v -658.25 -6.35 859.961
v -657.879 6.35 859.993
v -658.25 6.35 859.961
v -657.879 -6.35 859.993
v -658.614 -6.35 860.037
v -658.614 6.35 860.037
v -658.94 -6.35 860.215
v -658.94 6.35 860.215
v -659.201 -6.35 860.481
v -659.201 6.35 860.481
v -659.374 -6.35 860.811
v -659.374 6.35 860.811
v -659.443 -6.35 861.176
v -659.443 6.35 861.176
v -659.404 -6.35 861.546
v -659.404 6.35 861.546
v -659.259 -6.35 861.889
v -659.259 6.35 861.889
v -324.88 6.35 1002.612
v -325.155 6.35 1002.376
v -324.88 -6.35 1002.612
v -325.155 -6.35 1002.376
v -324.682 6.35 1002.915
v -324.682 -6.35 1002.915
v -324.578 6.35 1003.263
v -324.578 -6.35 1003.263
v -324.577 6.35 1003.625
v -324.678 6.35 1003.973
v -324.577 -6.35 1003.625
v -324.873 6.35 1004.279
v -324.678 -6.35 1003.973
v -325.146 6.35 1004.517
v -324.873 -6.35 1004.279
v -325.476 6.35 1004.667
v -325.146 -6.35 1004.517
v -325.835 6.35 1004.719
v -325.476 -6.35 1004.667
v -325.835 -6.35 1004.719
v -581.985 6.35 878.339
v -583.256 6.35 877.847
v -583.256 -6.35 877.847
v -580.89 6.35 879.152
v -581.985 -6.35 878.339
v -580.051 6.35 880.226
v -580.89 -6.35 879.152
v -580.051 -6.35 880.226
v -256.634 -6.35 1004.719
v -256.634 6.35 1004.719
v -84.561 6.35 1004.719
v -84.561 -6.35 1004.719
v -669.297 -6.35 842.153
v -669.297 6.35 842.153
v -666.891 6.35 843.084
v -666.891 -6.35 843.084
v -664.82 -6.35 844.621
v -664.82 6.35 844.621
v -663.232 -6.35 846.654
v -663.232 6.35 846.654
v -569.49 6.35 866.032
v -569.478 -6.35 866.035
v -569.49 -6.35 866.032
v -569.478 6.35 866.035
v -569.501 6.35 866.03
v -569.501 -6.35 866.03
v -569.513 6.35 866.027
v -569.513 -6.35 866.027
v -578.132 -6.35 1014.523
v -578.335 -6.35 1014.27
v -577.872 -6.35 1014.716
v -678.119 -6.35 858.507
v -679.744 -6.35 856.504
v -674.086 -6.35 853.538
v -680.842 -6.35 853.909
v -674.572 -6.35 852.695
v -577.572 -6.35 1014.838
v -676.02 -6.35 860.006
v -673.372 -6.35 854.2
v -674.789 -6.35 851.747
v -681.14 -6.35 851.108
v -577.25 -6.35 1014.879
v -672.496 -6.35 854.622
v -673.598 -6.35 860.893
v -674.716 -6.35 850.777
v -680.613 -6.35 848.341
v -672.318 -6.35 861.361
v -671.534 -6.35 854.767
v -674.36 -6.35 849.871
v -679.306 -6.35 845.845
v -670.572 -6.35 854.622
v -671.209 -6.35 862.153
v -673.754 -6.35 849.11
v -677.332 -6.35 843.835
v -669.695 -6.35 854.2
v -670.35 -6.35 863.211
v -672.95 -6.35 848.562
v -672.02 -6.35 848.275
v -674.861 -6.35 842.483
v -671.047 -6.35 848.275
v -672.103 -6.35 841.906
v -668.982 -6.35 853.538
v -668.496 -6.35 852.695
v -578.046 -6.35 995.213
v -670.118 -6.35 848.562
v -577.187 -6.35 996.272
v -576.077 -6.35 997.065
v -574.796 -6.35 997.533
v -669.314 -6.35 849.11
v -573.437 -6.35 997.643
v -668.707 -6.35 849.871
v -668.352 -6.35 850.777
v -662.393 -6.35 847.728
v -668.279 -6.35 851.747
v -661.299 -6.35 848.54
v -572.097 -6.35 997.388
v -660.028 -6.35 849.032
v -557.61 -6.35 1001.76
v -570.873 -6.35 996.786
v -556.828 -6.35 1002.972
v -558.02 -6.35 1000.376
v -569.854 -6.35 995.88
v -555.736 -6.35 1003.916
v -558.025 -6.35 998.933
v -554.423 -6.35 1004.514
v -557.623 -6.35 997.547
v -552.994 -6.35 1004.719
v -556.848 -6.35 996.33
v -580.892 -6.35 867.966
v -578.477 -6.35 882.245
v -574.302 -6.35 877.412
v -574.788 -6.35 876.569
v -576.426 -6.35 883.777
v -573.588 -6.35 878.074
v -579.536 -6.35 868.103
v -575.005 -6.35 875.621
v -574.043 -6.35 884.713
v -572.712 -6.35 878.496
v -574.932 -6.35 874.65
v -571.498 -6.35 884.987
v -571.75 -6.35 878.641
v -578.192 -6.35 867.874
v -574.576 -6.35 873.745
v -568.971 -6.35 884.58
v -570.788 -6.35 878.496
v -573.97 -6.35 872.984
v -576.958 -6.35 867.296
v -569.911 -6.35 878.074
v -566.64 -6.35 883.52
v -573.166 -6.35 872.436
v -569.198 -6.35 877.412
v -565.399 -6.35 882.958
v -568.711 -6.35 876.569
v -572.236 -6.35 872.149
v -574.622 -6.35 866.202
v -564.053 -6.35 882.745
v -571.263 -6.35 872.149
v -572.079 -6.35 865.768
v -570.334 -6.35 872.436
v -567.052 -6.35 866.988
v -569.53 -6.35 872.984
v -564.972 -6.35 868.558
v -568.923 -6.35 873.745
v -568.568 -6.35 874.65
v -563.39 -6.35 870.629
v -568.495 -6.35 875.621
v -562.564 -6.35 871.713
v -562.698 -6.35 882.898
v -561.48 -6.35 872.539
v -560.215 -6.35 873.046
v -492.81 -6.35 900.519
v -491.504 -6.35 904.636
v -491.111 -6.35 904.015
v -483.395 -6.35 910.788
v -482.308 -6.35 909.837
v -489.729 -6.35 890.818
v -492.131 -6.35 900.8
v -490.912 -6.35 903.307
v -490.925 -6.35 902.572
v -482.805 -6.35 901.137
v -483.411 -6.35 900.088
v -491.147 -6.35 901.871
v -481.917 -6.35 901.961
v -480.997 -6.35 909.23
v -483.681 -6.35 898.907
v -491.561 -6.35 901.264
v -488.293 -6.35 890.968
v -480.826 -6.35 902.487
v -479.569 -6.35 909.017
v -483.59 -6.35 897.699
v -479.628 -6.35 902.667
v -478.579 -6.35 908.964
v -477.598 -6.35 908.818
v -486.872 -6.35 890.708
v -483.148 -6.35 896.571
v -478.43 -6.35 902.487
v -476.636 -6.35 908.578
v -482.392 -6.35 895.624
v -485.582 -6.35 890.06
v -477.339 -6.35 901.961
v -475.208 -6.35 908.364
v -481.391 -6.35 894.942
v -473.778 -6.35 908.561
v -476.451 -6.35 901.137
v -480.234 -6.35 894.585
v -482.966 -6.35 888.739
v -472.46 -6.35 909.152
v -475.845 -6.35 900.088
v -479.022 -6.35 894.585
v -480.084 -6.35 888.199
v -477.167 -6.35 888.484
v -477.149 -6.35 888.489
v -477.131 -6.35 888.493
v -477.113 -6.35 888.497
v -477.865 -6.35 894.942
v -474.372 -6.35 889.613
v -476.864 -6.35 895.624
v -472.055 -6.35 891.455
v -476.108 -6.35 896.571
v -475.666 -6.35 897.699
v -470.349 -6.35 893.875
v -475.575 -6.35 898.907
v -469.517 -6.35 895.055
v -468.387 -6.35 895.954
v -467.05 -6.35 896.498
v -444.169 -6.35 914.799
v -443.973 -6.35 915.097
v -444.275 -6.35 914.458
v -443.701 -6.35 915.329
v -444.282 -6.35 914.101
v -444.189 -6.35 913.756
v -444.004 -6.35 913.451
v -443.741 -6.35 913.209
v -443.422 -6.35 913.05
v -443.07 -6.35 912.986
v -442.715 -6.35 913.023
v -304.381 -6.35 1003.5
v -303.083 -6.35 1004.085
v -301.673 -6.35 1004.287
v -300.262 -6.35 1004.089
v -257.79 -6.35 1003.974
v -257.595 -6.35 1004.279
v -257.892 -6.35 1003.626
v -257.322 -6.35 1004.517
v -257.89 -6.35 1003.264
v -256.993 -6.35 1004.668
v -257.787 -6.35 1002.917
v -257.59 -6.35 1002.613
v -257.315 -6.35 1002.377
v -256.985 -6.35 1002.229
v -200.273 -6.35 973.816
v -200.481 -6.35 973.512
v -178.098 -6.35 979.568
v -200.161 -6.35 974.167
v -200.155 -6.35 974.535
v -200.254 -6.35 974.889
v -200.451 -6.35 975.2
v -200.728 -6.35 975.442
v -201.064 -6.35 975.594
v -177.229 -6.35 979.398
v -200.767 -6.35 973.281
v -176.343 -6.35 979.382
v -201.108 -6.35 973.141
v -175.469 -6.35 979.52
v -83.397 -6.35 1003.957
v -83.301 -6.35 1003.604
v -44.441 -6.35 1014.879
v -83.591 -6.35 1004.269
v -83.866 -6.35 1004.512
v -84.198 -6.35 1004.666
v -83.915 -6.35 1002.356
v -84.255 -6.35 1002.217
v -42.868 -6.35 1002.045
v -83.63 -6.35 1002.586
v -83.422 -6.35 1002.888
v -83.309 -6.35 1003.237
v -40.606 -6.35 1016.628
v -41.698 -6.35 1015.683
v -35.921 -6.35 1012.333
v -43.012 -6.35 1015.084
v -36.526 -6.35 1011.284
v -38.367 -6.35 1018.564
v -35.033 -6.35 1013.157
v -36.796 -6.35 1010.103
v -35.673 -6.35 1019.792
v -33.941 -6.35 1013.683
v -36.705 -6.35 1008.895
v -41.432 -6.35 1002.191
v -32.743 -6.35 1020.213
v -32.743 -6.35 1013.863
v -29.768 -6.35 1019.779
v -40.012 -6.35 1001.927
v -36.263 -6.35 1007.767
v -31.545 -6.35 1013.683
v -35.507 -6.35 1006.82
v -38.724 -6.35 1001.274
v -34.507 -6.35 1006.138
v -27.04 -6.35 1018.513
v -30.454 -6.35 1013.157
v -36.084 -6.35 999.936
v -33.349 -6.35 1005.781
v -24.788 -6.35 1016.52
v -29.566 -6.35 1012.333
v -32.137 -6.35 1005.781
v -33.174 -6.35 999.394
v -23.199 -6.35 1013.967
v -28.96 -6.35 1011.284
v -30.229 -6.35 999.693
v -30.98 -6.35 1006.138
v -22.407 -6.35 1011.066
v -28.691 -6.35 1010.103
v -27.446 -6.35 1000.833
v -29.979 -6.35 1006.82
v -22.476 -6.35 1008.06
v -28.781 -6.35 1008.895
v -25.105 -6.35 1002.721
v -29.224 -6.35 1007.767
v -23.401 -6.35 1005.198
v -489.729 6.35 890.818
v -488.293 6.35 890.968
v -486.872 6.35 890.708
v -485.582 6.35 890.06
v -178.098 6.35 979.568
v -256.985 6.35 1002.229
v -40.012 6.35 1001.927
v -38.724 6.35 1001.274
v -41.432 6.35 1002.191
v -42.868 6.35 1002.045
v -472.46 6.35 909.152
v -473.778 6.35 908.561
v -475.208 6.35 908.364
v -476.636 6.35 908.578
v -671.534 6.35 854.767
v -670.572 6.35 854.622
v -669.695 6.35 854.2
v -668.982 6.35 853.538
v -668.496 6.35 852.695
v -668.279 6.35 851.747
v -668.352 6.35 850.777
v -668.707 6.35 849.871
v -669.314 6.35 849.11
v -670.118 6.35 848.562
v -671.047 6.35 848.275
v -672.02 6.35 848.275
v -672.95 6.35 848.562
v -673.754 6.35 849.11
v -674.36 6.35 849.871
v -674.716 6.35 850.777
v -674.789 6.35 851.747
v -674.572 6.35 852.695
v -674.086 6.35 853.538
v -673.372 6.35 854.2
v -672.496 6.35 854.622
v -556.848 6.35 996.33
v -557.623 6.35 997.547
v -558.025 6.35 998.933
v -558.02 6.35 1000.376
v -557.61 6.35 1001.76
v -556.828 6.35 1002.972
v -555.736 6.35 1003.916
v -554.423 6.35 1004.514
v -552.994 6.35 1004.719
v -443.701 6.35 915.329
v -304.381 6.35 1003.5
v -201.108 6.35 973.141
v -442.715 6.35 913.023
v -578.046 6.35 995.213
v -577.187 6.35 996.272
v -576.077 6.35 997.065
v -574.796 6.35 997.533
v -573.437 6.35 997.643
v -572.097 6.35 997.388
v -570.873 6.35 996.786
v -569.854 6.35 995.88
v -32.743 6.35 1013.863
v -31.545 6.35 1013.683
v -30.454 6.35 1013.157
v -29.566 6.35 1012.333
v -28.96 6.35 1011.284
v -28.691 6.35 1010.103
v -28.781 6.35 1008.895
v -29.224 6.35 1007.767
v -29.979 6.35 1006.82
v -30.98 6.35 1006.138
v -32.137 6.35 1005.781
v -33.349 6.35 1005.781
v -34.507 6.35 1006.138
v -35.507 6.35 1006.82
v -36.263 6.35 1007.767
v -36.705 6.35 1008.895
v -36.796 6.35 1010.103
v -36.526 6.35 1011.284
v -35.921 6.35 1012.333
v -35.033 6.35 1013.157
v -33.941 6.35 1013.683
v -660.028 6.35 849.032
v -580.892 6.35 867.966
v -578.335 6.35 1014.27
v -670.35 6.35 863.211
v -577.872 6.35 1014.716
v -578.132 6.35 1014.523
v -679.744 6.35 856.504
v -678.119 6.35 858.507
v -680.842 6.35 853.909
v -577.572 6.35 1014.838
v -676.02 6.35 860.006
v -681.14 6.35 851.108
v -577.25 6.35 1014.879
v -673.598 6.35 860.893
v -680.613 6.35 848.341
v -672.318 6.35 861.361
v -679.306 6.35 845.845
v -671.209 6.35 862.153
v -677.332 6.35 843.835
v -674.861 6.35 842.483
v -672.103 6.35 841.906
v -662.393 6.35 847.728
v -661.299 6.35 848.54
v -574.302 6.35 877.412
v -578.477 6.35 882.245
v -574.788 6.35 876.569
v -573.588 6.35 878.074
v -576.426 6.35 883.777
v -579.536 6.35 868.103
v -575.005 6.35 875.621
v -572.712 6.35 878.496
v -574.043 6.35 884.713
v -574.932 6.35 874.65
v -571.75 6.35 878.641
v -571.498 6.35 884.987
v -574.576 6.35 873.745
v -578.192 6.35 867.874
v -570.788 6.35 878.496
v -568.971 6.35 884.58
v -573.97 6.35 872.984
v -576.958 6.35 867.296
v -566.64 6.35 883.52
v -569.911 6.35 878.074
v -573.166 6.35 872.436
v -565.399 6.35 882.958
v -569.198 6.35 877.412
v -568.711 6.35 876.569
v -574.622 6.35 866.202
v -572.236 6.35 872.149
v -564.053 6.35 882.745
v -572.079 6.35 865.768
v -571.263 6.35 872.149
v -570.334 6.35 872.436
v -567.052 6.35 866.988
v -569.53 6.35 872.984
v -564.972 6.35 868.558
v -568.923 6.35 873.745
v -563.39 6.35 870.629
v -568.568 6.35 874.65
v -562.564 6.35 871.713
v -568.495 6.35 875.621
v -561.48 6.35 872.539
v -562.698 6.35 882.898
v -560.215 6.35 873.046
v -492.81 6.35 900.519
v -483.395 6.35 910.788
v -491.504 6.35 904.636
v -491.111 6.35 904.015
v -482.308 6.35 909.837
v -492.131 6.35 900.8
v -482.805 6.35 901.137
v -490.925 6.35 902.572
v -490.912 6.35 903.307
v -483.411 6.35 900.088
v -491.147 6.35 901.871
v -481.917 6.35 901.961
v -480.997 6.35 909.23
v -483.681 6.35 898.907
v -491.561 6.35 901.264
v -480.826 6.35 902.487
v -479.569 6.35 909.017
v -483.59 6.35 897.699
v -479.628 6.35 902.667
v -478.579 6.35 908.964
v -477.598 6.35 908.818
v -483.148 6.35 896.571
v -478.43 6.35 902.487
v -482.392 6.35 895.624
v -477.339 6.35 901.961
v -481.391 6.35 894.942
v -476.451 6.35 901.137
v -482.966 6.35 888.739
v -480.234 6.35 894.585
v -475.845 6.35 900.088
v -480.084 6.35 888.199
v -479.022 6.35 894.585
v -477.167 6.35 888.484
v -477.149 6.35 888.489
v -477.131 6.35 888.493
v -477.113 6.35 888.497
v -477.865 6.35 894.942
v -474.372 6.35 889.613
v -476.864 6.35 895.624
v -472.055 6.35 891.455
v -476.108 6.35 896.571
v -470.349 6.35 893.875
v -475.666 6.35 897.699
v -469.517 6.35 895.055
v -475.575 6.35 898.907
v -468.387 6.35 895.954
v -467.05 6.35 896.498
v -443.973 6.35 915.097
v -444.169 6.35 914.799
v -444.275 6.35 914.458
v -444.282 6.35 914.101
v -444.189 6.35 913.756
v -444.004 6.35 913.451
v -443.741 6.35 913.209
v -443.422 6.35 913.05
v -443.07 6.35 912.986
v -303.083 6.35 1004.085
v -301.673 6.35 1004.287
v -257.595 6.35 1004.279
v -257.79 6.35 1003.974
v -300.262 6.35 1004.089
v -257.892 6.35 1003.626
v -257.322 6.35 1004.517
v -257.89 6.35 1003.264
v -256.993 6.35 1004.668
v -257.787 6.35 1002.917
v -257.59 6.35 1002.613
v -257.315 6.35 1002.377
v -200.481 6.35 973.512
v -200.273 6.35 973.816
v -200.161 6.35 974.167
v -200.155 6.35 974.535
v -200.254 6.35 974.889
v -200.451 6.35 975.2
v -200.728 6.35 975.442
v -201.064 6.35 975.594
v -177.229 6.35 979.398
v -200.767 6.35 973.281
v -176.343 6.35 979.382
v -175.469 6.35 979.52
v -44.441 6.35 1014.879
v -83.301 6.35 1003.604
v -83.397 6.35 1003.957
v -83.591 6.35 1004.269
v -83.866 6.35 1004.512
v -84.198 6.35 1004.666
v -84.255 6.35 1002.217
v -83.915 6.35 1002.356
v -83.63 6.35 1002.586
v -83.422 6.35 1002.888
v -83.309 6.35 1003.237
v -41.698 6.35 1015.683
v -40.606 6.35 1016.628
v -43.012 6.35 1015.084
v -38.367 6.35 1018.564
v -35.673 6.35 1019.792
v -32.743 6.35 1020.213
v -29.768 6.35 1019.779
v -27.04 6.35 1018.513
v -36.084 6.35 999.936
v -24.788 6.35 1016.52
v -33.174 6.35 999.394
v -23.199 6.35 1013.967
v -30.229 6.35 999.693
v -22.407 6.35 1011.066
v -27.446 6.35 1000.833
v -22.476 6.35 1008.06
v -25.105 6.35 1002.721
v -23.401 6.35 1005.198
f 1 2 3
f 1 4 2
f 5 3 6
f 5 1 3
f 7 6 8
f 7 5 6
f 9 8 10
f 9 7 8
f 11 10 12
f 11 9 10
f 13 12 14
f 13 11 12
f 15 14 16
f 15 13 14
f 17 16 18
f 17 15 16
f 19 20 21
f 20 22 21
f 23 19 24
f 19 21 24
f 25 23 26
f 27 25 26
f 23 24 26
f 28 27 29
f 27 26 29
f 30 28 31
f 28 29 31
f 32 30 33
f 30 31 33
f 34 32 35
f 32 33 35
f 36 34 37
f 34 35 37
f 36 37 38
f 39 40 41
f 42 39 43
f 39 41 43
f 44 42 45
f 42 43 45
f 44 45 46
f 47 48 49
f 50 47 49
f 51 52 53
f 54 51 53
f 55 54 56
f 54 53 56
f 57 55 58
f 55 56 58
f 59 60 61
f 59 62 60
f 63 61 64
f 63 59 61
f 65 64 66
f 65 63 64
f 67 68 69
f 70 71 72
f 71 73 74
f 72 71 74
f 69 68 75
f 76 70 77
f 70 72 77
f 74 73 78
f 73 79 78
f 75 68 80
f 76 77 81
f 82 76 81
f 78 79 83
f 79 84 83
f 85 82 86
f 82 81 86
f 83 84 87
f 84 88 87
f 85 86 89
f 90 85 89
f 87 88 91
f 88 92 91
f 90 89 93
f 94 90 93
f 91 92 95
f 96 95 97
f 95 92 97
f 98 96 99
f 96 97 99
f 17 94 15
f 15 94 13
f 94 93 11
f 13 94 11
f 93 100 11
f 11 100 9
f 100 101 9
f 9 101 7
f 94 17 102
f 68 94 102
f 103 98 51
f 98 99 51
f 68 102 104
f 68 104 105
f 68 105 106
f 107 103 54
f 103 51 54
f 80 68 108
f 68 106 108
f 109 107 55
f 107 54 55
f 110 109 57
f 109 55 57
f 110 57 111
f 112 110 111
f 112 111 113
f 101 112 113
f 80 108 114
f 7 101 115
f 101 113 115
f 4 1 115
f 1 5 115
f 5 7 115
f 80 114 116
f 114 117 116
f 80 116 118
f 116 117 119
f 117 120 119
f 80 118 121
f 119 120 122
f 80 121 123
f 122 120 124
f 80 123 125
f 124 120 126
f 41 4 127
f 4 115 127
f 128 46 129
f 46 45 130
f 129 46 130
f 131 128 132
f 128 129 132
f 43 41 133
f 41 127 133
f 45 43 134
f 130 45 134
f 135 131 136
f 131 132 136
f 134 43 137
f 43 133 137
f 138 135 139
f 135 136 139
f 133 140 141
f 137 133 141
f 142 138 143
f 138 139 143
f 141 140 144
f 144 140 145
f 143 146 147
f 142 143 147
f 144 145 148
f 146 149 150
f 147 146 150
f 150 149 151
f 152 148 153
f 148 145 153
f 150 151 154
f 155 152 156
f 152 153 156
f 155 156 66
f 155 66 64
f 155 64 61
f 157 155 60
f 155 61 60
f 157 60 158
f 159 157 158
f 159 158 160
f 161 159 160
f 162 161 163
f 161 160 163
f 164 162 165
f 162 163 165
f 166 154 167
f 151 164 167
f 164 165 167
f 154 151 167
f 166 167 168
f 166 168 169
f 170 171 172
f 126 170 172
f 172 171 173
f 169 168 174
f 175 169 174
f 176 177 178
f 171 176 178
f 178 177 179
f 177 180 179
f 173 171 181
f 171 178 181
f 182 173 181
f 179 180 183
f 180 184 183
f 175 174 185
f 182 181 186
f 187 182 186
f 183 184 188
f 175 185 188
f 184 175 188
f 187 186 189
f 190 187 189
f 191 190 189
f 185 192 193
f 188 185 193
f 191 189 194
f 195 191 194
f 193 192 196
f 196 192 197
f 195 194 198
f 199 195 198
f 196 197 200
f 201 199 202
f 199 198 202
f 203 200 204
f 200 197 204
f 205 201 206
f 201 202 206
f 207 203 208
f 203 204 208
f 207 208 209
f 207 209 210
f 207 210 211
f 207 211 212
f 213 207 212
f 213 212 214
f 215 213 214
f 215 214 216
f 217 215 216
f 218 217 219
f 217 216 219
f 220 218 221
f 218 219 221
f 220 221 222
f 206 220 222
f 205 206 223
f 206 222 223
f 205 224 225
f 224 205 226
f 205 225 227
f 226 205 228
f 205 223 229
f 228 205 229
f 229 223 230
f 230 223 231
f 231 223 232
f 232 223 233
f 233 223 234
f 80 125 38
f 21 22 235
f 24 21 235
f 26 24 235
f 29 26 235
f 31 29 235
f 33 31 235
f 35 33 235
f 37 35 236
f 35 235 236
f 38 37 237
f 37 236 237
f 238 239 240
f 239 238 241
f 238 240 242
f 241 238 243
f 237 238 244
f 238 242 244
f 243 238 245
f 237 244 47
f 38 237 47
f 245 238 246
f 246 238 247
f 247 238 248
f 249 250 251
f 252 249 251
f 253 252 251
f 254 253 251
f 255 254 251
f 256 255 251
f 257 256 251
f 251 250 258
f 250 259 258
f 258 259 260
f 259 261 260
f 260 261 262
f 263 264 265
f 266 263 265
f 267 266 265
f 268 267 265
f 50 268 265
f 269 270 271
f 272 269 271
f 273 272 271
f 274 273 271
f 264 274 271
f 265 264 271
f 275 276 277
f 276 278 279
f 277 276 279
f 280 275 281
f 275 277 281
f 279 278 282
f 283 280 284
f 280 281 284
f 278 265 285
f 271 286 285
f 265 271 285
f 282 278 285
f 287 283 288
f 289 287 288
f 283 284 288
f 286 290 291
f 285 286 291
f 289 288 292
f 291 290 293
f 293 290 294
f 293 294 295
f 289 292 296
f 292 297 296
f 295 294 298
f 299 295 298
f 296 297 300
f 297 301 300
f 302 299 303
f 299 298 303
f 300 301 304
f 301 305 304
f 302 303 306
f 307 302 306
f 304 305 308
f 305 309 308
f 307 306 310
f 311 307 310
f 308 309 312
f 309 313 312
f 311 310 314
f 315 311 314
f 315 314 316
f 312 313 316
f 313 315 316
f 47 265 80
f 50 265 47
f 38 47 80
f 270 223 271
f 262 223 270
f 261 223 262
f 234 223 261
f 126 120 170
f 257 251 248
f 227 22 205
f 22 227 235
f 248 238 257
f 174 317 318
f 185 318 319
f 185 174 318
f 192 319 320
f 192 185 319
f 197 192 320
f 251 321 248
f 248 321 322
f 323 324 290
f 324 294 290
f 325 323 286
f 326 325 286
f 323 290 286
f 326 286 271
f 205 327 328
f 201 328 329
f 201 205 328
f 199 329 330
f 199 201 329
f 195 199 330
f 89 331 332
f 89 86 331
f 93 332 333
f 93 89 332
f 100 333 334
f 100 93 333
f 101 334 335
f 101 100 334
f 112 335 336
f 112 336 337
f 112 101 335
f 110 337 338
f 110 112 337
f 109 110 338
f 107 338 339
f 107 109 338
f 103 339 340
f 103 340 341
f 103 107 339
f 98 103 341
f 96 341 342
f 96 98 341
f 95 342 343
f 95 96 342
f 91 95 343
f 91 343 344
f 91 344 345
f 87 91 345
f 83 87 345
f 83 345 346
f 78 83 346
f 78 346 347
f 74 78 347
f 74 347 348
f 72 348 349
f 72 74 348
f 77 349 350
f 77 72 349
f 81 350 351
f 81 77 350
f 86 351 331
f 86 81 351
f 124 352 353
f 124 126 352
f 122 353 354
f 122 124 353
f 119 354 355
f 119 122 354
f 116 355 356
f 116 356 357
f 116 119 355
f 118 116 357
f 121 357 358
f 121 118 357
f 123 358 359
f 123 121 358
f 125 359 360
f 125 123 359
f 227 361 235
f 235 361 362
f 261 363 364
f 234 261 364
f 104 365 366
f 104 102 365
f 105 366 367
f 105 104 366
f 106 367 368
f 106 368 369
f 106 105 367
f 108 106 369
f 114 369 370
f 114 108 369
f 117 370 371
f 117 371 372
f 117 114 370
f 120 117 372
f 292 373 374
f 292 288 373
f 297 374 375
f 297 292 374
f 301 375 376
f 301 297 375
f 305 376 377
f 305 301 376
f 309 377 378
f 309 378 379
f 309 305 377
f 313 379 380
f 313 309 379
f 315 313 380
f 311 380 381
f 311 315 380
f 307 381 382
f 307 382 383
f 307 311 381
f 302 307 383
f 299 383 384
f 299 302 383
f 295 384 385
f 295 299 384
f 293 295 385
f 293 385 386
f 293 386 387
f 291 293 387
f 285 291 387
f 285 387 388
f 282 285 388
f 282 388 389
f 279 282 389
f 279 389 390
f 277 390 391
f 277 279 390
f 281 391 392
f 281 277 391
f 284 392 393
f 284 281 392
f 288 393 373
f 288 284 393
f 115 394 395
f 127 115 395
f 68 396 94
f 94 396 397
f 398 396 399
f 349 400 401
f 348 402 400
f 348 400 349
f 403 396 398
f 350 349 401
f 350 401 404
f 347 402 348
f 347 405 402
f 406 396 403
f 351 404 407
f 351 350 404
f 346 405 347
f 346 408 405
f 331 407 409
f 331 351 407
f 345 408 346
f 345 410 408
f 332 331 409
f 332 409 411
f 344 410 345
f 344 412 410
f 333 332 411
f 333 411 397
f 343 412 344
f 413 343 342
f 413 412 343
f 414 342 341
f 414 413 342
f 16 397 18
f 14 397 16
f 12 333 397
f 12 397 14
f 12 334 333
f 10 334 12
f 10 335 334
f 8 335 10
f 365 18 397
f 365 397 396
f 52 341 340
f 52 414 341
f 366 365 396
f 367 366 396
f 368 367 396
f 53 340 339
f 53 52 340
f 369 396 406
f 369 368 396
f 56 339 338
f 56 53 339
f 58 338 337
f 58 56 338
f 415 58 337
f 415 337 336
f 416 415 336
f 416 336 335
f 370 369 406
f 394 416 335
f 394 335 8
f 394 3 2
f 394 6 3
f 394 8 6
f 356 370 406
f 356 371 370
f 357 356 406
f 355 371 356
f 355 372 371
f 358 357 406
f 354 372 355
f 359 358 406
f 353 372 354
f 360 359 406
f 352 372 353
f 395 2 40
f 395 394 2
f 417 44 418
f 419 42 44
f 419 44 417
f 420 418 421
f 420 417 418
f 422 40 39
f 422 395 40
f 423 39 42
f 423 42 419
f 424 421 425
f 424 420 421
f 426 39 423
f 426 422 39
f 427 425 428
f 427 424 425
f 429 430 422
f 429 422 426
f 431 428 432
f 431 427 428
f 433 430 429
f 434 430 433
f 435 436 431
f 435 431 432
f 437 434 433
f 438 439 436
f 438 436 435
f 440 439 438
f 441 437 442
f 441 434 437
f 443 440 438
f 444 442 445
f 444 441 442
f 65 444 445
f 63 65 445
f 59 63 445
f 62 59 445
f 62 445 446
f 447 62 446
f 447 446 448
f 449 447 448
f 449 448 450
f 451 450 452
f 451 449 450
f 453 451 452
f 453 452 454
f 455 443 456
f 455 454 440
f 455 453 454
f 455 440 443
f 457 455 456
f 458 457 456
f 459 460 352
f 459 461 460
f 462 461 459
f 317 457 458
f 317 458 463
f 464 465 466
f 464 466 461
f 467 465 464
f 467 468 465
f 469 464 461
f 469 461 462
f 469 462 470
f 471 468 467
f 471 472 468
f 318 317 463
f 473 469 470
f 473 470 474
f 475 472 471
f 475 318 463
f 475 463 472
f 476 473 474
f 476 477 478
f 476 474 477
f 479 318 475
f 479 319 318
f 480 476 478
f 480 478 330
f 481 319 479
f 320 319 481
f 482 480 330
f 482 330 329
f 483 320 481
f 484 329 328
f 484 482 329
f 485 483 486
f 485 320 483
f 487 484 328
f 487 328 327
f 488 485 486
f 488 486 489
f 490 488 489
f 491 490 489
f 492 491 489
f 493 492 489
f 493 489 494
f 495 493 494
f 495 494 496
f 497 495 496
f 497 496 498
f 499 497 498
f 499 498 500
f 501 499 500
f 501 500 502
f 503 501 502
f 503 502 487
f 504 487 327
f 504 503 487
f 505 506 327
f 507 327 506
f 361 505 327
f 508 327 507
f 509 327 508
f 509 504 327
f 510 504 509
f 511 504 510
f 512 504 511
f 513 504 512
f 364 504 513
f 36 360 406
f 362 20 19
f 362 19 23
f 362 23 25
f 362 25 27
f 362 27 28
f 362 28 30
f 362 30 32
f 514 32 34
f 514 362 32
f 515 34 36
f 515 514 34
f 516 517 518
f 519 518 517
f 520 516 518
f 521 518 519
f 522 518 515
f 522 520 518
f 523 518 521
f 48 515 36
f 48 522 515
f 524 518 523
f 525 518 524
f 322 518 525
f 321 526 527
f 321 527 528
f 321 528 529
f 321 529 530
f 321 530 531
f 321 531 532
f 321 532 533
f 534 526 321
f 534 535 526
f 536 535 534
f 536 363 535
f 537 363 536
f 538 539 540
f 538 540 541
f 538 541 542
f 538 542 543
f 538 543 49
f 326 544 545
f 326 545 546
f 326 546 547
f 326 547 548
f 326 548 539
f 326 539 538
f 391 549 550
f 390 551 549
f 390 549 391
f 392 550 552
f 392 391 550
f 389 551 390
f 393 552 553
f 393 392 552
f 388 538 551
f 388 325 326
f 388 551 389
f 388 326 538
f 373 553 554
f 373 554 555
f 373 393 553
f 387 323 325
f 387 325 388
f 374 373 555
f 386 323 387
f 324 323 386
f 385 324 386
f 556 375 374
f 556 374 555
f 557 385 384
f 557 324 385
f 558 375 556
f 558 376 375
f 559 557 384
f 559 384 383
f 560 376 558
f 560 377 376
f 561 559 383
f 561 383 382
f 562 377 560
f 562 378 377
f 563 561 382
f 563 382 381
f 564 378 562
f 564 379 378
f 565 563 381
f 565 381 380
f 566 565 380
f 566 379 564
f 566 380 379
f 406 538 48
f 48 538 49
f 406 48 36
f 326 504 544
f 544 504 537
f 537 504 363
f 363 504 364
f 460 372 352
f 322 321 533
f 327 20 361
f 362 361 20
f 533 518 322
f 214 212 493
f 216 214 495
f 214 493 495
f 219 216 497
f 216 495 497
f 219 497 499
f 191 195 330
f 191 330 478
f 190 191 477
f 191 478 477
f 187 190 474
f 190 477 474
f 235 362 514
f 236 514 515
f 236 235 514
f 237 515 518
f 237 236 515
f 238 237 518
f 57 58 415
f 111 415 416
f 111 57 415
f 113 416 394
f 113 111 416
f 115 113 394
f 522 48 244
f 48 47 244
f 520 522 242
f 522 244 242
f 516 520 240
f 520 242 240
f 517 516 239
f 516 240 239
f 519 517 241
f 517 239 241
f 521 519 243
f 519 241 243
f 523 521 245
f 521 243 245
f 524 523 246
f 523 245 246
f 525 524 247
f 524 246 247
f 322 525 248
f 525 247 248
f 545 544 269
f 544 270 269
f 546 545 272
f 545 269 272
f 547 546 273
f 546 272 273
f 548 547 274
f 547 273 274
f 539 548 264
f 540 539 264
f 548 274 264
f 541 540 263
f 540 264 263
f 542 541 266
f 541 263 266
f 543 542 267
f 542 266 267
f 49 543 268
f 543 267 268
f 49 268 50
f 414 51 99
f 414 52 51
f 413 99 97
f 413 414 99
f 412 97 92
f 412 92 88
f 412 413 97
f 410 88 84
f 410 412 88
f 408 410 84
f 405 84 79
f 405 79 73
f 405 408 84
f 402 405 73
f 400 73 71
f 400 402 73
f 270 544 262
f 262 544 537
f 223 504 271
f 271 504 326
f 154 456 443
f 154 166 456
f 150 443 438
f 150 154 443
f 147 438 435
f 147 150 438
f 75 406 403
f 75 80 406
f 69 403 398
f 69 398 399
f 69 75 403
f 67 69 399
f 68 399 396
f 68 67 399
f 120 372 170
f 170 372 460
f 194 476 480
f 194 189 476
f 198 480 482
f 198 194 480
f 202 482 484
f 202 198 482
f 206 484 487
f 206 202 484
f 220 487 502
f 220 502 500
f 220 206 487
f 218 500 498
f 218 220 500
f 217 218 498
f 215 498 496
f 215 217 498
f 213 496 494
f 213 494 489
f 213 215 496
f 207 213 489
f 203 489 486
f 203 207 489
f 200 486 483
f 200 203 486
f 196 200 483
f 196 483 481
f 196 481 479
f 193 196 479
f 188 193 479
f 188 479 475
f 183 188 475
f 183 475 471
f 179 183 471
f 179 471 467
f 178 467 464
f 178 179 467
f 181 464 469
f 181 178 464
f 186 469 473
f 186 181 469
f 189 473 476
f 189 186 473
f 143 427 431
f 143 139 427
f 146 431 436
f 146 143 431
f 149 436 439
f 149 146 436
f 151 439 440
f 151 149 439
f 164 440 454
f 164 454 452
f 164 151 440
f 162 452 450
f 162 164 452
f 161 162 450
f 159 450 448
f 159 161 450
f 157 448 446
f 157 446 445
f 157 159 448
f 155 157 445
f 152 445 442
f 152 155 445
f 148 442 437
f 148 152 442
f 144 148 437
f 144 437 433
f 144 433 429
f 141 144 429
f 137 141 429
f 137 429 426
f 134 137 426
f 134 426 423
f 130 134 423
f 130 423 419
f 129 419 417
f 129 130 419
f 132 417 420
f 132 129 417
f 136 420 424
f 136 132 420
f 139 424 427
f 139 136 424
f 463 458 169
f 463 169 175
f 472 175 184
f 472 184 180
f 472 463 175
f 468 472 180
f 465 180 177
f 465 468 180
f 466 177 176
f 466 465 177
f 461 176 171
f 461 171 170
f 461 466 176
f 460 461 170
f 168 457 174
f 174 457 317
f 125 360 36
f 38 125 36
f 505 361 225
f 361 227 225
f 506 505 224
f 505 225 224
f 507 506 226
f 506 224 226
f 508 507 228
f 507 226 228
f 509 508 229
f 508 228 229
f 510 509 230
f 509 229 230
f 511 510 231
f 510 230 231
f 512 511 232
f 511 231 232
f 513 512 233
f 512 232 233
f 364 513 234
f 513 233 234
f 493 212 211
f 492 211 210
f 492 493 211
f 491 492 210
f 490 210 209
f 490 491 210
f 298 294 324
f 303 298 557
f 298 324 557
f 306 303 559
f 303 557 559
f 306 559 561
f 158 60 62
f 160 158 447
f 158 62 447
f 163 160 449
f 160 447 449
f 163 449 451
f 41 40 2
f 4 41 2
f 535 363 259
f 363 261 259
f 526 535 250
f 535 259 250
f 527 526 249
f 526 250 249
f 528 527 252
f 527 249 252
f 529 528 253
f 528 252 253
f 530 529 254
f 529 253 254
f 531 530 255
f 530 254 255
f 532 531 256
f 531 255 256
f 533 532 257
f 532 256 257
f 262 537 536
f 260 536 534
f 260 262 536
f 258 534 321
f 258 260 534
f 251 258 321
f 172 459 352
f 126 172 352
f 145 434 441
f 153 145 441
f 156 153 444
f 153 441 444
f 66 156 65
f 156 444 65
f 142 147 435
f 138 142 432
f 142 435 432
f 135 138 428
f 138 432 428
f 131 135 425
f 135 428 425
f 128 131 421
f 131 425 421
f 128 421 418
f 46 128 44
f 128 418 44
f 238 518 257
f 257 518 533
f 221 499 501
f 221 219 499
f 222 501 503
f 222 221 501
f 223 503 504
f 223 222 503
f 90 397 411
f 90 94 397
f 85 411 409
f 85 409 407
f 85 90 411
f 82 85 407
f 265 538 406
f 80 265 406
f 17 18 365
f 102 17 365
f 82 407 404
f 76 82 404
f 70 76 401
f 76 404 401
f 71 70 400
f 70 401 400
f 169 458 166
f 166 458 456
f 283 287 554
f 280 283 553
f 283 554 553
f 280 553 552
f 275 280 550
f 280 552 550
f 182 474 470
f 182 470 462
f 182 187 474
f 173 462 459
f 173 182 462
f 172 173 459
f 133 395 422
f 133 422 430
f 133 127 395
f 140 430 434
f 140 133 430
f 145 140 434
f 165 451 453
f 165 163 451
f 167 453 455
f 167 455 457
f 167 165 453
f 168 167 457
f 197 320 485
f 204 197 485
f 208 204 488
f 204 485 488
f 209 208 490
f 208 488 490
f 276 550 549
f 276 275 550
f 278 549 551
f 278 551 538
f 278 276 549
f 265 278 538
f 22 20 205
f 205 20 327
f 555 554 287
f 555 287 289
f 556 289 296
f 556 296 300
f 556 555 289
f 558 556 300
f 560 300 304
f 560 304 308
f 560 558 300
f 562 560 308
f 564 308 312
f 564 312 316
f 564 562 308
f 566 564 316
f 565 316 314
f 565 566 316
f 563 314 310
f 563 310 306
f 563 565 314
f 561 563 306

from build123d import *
from build123d.topology import SkipClean

# Parameters (mm, degrees)
SKETCH1_R           = 4.064
SKETCH1_R_2         = 3.2639
BOSS_EXTRUDE1_DEPTH = 6.35
CUT_EXTRUDE1_DEPTH  = 1227.767455485
FILLET1_R           = 5.08
FILLET2_R           = 1.27
FILLET3_R           = 2.54


with BuildPart() as part:
    # Sketch1 → Boss-Extrude1 (new, symmetric)
    with BuildSketch(Plane(origin=(0, 0, 0), x_dir=(1, 0, 0), z_dir=(0, 1, 0))):
        with BuildLine():
            Line((-580.023560274, -1020.213175904), (-32.743203186, -1020.213175904))
            ThreePointArc((-32.743203186, -1020.213175904), (-22.406526942, -1011.065872486), (-30.22862042, -999.693322674))
            Line((-30.22862042, -999.693322674), (-477.113436037, -888.497480987))
            ThreePointArc((-477.113436037, -888.497480987), (-477.140285594, -888.490838013), (-477.1671527, -888.484266374))
            Line((-477.1671527, -888.484266374), (-569.477932839, -866.035116584))
            ThreePointArc((-569.477932839, -866.035116584), (-569.495309073, -866.030907949), (-569.512693103, -866.026731636))
            Line((-569.512693103, -866.026731636), (-669.296750672, -842.152874275))
            ThreePointArc((-669.296750672, -842.152874275), (-679.306252785, -845.844627483), (-679.744367756, -856.504234867))
            Line((-679.744367756, -856.504234867), (-580.023560274, -1020.213175904))
        make_face()
        with Locations(Location((-32.743203186, -1009.799175904, 0), (0, 0, 270))):
            Circle(SKETCH1_R, mode=Mode.SUBTRACT)
        with Locations(Location((-479.628018803, -898.603334218, 0), (0, 0, 270))):
            Circle(SKETCH1_R, mode=Mode.SUBTRACT)
        with Locations(Location((-571.749732399, -875.37674385, 0), (0, 0, 270))):
            Circle(SKETCH1_R_2, mode=Mode.SUBTRACT)
        with Locations(Location((-671.533789968, -851.502886488, 0), (0, 0, 270))):
            Circle(SKETCH1_R_2, mode=Mode.SUBTRACT)
    extrude(amount=BOSS_EXTRUDE1_DEPTH, both=True)

    # Sketch2 → Cut-Extrude1 (cut, through all)
    with SkipClean():  # the faces are left unmerged after this step: merging them gives an invalid solid
        with BuildSketch(Plane(origin=(0, 6.35, 0), x_dir=(1, 0, 0), z_dir=(0, 1, 0))):
            with BuildLine():
                Line((-679.744367756, -856.504234867), (-580.023560274, -1020.213175904))
                Line((-580.023560274, -1020.213175904), (-32.743203186, -1020.213175904))
                ThreePointArc((-32.743203186, -1020.213175904), (-38.013320642, -1018.781227897), (-41.834132511, -1014.879175904))
                Line((-41.834132511, -1014.879175904), (-577.963867352, -1014.879175904))
                Line((-577.963867352, -1014.879175904), (-671.626154715, -861.116342785))
                ThreePointArc((-671.626154715, -861.116342785), (-676.282747595, -859.861981814), (-679.744367756, -856.504234867))
            make_face()
            with BuildLine():
                Line((-569.512693103, -866.026731636), (-669.296750672, -842.152874275))
                ThreePointArc((-669.296750672, -842.152874275), (-665.037914564, -844.415526194), (-662.413625342, -848.461559408))
                Line((-662.413625342, -848.461559408), (-578.505786805, -868.536948379))
                ThreePointArc((-578.505786805, -868.536948379), (-574.334431882, -866.116808548), (-569.512693103, -866.026731636))
            make_face()
            with BuildLine():
                Line((-469.57946129, -895.868761508), (-40.33850922, -1002.674379609))
                ThreePointArc((-40.33850922, -1002.674379609), (-35.688557552, -999.810367984), (-30.22862042, -999.693322674))
                Line((-30.22862042, -999.693322674), (-477.113436037, -888.497480987))
                ThreePointArc((-477.113436037, -888.497480987), (-472.345020276, -891.159589968), (-469.57946129, -895.868761508))
            make_face()
            with BuildLine():
                Line((-477.1671527, -888.484266374), (-569.477932839, -866.035116584))
                ThreePointArc((-569.477932839, -866.035116584), (-565.197857445, -868.341119656), (-562.593315725, -872.446367271))
                Line((-562.593315725, -872.446367271), (-487.201130908, -891.45495195))
                ThreePointArc((-487.201130908, -891.45495195), (-482.584369255, -888.617775245), (-477.1671527, -888.484266374))
            make_face()
            with BuildLine():
                ThreePointArc((-565.077216711, -882.298059303), (-574.043489966, -884.713003777), (-580.869897025, -878.41807093))
                Line((-580.869897025, -878.41807093), (-660.846200897, -859.283322179))
                Line((-660.846200897, -859.283322179), (-574.408981883, -1001.184956836))
                Line((-574.408981883, -1001.184956836), (-489.404527792, -902.190989161))
                ThreePointArc((-489.404527792, -902.190989161), (-489.554632834, -901.751941826), (-489.685031894, -901.306643982))
                Line((-489.685031894, -901.306643982), (-565.077216711, -882.298059303))
            make_face()
            Polygon((-196.508330191, -974.285316963), (-450.342933685, -911.125076565), (-302.454173976, -1004.719175904), align=None)
            with BuildLine():
                Line((-321.452940497, -1004.719175904), (-474.662853281, -907.757487774))
                ThreePointArc((-474.662853281, -907.757487774), (-478.086983606, -908.902684028), (-481.696350414, -908.809871355))
                Line((-481.696350414, -908.809871355), (-564.05205619, -1004.719175904))
                Line((-564.05205619, -1004.719175904), (-321.452940497, -1004.719175904))
            make_face()
            Polygon((-74.197736242, -1004.719175904), (-176.789592181, -979.191819922), (-265.654999436, -1004.719175904), align=None)
        extrude(amount=-CUT_EXTRUDE1_DEPTH, mode=Mode.SUBTRACT)

    # Fillet1
    fillet1_edges = [part.edges().sort_by_distance(p)[0] for p in [
        (-662.413625342, 0, 848.461559408),
        (-578.505786805, 0, 868.536948379),
        (-671.626154715, 0, 861.116342785),
        (-41.834132511, 0, 1014.879175904),
        (-302.454173976, 0, 1004.719175904),
        (-176.789592181, 0, 979.191819922),
        (-580.869897025, 0, 878.41807093),
        (-565.077216711, 0, 882.298059303),
        (-574.408981883, 0, 1001.184956836),
        (-469.57946129, 0, 895.868761508),
        (-40.33850922, 0, 1002.674379609),
        (-481.696350414, 0, 908.809871355),
        (-474.662853281, 0, 907.757487774),
        (-564.05205619, 0, 1004.719175904),
        (-562.593315725, 0, 872.446367271),
        (-487.201130908, 0, 891.45495195),
    ]]
    fillet(fillet1_edges, radius=FILLET1_R)

    # Fillet2
    fillet2_edges = [part.edges().sort_by_distance(p)[0] for p in [
        (-577.963867352, 0, 1014.879175904),
        (-450.342933685, 0, 911.125076565),
        (-196.508330191, 0, 974.285316963),
        (-74.197736242, 0, 1004.719175904),
        (-265.654999436, 0, 1004.719175904),
        (-660.846200897, 0, 859.283322179),
        (-321.452940497, 0, 1004.719175904),
    ]]
    fillet(fillet2_edges, radius=FILLET2_R)

    # Fillet3
    # the kernel refuses this fillet: 2.54 mm, written as the material it adds along each edge
    with BuildSketch(Plane(origin=(-489.685031894, 6.35, 901.306643982), x_dir=(-0.9696547275451901, 0, -0.24447844352675166), z_dir=(0, -1, 0))) as fillet3_piece_1:
        with BuildLine():
            CenterArc((3.223121953, -2.54), FILLET3_R, 90, 116.501118017)
            Line((0.95001079, -3.673386801), (0.722699673, -3.786725481))
            ThreePointArc((0.722699673, -3.786725481), (-0.715506578, -0.902270957), (-0.221729984, 0.123902439))
            Line((-0.221729984, 0.123902439), (0, 0.254))
            Line((0, 0.254), (3.223121953, 0.254))
            Line((3.223121953, 0.254), (3.223121953, 0))
        make_face()
    extrude(amount=12.7)
    with BuildSketch(Plane(origin=(-489.404527792, 6.35, 902.190989161), x_dir=(-0.6514647829655796, 0, 0.7586788757805311), z_dir=(0, -1, 0))) as fillet3_piece_2:
        with BuildLine():
            CenterArc((3.223121953, 2.54), FILLET3_R, 153.498881983, 116.501118017)
            Line((0.95001079, 3.673386801), (0.722699673, 3.786725481))
            ThreePointArc((0.722699673, 3.786725481), (-0.715506578, 0.902270957), (-0.221729984, -0.123902439))
            Line((-0.221729984, -0.123902439), (0, -0.254))
            Line((0, -0.254), (3.223121953, -0.254))
            Line((3.223121953, -0.254), (3.223121953, 0))
        make_face()
    extrude(amount=12.7)


solid = part.part
